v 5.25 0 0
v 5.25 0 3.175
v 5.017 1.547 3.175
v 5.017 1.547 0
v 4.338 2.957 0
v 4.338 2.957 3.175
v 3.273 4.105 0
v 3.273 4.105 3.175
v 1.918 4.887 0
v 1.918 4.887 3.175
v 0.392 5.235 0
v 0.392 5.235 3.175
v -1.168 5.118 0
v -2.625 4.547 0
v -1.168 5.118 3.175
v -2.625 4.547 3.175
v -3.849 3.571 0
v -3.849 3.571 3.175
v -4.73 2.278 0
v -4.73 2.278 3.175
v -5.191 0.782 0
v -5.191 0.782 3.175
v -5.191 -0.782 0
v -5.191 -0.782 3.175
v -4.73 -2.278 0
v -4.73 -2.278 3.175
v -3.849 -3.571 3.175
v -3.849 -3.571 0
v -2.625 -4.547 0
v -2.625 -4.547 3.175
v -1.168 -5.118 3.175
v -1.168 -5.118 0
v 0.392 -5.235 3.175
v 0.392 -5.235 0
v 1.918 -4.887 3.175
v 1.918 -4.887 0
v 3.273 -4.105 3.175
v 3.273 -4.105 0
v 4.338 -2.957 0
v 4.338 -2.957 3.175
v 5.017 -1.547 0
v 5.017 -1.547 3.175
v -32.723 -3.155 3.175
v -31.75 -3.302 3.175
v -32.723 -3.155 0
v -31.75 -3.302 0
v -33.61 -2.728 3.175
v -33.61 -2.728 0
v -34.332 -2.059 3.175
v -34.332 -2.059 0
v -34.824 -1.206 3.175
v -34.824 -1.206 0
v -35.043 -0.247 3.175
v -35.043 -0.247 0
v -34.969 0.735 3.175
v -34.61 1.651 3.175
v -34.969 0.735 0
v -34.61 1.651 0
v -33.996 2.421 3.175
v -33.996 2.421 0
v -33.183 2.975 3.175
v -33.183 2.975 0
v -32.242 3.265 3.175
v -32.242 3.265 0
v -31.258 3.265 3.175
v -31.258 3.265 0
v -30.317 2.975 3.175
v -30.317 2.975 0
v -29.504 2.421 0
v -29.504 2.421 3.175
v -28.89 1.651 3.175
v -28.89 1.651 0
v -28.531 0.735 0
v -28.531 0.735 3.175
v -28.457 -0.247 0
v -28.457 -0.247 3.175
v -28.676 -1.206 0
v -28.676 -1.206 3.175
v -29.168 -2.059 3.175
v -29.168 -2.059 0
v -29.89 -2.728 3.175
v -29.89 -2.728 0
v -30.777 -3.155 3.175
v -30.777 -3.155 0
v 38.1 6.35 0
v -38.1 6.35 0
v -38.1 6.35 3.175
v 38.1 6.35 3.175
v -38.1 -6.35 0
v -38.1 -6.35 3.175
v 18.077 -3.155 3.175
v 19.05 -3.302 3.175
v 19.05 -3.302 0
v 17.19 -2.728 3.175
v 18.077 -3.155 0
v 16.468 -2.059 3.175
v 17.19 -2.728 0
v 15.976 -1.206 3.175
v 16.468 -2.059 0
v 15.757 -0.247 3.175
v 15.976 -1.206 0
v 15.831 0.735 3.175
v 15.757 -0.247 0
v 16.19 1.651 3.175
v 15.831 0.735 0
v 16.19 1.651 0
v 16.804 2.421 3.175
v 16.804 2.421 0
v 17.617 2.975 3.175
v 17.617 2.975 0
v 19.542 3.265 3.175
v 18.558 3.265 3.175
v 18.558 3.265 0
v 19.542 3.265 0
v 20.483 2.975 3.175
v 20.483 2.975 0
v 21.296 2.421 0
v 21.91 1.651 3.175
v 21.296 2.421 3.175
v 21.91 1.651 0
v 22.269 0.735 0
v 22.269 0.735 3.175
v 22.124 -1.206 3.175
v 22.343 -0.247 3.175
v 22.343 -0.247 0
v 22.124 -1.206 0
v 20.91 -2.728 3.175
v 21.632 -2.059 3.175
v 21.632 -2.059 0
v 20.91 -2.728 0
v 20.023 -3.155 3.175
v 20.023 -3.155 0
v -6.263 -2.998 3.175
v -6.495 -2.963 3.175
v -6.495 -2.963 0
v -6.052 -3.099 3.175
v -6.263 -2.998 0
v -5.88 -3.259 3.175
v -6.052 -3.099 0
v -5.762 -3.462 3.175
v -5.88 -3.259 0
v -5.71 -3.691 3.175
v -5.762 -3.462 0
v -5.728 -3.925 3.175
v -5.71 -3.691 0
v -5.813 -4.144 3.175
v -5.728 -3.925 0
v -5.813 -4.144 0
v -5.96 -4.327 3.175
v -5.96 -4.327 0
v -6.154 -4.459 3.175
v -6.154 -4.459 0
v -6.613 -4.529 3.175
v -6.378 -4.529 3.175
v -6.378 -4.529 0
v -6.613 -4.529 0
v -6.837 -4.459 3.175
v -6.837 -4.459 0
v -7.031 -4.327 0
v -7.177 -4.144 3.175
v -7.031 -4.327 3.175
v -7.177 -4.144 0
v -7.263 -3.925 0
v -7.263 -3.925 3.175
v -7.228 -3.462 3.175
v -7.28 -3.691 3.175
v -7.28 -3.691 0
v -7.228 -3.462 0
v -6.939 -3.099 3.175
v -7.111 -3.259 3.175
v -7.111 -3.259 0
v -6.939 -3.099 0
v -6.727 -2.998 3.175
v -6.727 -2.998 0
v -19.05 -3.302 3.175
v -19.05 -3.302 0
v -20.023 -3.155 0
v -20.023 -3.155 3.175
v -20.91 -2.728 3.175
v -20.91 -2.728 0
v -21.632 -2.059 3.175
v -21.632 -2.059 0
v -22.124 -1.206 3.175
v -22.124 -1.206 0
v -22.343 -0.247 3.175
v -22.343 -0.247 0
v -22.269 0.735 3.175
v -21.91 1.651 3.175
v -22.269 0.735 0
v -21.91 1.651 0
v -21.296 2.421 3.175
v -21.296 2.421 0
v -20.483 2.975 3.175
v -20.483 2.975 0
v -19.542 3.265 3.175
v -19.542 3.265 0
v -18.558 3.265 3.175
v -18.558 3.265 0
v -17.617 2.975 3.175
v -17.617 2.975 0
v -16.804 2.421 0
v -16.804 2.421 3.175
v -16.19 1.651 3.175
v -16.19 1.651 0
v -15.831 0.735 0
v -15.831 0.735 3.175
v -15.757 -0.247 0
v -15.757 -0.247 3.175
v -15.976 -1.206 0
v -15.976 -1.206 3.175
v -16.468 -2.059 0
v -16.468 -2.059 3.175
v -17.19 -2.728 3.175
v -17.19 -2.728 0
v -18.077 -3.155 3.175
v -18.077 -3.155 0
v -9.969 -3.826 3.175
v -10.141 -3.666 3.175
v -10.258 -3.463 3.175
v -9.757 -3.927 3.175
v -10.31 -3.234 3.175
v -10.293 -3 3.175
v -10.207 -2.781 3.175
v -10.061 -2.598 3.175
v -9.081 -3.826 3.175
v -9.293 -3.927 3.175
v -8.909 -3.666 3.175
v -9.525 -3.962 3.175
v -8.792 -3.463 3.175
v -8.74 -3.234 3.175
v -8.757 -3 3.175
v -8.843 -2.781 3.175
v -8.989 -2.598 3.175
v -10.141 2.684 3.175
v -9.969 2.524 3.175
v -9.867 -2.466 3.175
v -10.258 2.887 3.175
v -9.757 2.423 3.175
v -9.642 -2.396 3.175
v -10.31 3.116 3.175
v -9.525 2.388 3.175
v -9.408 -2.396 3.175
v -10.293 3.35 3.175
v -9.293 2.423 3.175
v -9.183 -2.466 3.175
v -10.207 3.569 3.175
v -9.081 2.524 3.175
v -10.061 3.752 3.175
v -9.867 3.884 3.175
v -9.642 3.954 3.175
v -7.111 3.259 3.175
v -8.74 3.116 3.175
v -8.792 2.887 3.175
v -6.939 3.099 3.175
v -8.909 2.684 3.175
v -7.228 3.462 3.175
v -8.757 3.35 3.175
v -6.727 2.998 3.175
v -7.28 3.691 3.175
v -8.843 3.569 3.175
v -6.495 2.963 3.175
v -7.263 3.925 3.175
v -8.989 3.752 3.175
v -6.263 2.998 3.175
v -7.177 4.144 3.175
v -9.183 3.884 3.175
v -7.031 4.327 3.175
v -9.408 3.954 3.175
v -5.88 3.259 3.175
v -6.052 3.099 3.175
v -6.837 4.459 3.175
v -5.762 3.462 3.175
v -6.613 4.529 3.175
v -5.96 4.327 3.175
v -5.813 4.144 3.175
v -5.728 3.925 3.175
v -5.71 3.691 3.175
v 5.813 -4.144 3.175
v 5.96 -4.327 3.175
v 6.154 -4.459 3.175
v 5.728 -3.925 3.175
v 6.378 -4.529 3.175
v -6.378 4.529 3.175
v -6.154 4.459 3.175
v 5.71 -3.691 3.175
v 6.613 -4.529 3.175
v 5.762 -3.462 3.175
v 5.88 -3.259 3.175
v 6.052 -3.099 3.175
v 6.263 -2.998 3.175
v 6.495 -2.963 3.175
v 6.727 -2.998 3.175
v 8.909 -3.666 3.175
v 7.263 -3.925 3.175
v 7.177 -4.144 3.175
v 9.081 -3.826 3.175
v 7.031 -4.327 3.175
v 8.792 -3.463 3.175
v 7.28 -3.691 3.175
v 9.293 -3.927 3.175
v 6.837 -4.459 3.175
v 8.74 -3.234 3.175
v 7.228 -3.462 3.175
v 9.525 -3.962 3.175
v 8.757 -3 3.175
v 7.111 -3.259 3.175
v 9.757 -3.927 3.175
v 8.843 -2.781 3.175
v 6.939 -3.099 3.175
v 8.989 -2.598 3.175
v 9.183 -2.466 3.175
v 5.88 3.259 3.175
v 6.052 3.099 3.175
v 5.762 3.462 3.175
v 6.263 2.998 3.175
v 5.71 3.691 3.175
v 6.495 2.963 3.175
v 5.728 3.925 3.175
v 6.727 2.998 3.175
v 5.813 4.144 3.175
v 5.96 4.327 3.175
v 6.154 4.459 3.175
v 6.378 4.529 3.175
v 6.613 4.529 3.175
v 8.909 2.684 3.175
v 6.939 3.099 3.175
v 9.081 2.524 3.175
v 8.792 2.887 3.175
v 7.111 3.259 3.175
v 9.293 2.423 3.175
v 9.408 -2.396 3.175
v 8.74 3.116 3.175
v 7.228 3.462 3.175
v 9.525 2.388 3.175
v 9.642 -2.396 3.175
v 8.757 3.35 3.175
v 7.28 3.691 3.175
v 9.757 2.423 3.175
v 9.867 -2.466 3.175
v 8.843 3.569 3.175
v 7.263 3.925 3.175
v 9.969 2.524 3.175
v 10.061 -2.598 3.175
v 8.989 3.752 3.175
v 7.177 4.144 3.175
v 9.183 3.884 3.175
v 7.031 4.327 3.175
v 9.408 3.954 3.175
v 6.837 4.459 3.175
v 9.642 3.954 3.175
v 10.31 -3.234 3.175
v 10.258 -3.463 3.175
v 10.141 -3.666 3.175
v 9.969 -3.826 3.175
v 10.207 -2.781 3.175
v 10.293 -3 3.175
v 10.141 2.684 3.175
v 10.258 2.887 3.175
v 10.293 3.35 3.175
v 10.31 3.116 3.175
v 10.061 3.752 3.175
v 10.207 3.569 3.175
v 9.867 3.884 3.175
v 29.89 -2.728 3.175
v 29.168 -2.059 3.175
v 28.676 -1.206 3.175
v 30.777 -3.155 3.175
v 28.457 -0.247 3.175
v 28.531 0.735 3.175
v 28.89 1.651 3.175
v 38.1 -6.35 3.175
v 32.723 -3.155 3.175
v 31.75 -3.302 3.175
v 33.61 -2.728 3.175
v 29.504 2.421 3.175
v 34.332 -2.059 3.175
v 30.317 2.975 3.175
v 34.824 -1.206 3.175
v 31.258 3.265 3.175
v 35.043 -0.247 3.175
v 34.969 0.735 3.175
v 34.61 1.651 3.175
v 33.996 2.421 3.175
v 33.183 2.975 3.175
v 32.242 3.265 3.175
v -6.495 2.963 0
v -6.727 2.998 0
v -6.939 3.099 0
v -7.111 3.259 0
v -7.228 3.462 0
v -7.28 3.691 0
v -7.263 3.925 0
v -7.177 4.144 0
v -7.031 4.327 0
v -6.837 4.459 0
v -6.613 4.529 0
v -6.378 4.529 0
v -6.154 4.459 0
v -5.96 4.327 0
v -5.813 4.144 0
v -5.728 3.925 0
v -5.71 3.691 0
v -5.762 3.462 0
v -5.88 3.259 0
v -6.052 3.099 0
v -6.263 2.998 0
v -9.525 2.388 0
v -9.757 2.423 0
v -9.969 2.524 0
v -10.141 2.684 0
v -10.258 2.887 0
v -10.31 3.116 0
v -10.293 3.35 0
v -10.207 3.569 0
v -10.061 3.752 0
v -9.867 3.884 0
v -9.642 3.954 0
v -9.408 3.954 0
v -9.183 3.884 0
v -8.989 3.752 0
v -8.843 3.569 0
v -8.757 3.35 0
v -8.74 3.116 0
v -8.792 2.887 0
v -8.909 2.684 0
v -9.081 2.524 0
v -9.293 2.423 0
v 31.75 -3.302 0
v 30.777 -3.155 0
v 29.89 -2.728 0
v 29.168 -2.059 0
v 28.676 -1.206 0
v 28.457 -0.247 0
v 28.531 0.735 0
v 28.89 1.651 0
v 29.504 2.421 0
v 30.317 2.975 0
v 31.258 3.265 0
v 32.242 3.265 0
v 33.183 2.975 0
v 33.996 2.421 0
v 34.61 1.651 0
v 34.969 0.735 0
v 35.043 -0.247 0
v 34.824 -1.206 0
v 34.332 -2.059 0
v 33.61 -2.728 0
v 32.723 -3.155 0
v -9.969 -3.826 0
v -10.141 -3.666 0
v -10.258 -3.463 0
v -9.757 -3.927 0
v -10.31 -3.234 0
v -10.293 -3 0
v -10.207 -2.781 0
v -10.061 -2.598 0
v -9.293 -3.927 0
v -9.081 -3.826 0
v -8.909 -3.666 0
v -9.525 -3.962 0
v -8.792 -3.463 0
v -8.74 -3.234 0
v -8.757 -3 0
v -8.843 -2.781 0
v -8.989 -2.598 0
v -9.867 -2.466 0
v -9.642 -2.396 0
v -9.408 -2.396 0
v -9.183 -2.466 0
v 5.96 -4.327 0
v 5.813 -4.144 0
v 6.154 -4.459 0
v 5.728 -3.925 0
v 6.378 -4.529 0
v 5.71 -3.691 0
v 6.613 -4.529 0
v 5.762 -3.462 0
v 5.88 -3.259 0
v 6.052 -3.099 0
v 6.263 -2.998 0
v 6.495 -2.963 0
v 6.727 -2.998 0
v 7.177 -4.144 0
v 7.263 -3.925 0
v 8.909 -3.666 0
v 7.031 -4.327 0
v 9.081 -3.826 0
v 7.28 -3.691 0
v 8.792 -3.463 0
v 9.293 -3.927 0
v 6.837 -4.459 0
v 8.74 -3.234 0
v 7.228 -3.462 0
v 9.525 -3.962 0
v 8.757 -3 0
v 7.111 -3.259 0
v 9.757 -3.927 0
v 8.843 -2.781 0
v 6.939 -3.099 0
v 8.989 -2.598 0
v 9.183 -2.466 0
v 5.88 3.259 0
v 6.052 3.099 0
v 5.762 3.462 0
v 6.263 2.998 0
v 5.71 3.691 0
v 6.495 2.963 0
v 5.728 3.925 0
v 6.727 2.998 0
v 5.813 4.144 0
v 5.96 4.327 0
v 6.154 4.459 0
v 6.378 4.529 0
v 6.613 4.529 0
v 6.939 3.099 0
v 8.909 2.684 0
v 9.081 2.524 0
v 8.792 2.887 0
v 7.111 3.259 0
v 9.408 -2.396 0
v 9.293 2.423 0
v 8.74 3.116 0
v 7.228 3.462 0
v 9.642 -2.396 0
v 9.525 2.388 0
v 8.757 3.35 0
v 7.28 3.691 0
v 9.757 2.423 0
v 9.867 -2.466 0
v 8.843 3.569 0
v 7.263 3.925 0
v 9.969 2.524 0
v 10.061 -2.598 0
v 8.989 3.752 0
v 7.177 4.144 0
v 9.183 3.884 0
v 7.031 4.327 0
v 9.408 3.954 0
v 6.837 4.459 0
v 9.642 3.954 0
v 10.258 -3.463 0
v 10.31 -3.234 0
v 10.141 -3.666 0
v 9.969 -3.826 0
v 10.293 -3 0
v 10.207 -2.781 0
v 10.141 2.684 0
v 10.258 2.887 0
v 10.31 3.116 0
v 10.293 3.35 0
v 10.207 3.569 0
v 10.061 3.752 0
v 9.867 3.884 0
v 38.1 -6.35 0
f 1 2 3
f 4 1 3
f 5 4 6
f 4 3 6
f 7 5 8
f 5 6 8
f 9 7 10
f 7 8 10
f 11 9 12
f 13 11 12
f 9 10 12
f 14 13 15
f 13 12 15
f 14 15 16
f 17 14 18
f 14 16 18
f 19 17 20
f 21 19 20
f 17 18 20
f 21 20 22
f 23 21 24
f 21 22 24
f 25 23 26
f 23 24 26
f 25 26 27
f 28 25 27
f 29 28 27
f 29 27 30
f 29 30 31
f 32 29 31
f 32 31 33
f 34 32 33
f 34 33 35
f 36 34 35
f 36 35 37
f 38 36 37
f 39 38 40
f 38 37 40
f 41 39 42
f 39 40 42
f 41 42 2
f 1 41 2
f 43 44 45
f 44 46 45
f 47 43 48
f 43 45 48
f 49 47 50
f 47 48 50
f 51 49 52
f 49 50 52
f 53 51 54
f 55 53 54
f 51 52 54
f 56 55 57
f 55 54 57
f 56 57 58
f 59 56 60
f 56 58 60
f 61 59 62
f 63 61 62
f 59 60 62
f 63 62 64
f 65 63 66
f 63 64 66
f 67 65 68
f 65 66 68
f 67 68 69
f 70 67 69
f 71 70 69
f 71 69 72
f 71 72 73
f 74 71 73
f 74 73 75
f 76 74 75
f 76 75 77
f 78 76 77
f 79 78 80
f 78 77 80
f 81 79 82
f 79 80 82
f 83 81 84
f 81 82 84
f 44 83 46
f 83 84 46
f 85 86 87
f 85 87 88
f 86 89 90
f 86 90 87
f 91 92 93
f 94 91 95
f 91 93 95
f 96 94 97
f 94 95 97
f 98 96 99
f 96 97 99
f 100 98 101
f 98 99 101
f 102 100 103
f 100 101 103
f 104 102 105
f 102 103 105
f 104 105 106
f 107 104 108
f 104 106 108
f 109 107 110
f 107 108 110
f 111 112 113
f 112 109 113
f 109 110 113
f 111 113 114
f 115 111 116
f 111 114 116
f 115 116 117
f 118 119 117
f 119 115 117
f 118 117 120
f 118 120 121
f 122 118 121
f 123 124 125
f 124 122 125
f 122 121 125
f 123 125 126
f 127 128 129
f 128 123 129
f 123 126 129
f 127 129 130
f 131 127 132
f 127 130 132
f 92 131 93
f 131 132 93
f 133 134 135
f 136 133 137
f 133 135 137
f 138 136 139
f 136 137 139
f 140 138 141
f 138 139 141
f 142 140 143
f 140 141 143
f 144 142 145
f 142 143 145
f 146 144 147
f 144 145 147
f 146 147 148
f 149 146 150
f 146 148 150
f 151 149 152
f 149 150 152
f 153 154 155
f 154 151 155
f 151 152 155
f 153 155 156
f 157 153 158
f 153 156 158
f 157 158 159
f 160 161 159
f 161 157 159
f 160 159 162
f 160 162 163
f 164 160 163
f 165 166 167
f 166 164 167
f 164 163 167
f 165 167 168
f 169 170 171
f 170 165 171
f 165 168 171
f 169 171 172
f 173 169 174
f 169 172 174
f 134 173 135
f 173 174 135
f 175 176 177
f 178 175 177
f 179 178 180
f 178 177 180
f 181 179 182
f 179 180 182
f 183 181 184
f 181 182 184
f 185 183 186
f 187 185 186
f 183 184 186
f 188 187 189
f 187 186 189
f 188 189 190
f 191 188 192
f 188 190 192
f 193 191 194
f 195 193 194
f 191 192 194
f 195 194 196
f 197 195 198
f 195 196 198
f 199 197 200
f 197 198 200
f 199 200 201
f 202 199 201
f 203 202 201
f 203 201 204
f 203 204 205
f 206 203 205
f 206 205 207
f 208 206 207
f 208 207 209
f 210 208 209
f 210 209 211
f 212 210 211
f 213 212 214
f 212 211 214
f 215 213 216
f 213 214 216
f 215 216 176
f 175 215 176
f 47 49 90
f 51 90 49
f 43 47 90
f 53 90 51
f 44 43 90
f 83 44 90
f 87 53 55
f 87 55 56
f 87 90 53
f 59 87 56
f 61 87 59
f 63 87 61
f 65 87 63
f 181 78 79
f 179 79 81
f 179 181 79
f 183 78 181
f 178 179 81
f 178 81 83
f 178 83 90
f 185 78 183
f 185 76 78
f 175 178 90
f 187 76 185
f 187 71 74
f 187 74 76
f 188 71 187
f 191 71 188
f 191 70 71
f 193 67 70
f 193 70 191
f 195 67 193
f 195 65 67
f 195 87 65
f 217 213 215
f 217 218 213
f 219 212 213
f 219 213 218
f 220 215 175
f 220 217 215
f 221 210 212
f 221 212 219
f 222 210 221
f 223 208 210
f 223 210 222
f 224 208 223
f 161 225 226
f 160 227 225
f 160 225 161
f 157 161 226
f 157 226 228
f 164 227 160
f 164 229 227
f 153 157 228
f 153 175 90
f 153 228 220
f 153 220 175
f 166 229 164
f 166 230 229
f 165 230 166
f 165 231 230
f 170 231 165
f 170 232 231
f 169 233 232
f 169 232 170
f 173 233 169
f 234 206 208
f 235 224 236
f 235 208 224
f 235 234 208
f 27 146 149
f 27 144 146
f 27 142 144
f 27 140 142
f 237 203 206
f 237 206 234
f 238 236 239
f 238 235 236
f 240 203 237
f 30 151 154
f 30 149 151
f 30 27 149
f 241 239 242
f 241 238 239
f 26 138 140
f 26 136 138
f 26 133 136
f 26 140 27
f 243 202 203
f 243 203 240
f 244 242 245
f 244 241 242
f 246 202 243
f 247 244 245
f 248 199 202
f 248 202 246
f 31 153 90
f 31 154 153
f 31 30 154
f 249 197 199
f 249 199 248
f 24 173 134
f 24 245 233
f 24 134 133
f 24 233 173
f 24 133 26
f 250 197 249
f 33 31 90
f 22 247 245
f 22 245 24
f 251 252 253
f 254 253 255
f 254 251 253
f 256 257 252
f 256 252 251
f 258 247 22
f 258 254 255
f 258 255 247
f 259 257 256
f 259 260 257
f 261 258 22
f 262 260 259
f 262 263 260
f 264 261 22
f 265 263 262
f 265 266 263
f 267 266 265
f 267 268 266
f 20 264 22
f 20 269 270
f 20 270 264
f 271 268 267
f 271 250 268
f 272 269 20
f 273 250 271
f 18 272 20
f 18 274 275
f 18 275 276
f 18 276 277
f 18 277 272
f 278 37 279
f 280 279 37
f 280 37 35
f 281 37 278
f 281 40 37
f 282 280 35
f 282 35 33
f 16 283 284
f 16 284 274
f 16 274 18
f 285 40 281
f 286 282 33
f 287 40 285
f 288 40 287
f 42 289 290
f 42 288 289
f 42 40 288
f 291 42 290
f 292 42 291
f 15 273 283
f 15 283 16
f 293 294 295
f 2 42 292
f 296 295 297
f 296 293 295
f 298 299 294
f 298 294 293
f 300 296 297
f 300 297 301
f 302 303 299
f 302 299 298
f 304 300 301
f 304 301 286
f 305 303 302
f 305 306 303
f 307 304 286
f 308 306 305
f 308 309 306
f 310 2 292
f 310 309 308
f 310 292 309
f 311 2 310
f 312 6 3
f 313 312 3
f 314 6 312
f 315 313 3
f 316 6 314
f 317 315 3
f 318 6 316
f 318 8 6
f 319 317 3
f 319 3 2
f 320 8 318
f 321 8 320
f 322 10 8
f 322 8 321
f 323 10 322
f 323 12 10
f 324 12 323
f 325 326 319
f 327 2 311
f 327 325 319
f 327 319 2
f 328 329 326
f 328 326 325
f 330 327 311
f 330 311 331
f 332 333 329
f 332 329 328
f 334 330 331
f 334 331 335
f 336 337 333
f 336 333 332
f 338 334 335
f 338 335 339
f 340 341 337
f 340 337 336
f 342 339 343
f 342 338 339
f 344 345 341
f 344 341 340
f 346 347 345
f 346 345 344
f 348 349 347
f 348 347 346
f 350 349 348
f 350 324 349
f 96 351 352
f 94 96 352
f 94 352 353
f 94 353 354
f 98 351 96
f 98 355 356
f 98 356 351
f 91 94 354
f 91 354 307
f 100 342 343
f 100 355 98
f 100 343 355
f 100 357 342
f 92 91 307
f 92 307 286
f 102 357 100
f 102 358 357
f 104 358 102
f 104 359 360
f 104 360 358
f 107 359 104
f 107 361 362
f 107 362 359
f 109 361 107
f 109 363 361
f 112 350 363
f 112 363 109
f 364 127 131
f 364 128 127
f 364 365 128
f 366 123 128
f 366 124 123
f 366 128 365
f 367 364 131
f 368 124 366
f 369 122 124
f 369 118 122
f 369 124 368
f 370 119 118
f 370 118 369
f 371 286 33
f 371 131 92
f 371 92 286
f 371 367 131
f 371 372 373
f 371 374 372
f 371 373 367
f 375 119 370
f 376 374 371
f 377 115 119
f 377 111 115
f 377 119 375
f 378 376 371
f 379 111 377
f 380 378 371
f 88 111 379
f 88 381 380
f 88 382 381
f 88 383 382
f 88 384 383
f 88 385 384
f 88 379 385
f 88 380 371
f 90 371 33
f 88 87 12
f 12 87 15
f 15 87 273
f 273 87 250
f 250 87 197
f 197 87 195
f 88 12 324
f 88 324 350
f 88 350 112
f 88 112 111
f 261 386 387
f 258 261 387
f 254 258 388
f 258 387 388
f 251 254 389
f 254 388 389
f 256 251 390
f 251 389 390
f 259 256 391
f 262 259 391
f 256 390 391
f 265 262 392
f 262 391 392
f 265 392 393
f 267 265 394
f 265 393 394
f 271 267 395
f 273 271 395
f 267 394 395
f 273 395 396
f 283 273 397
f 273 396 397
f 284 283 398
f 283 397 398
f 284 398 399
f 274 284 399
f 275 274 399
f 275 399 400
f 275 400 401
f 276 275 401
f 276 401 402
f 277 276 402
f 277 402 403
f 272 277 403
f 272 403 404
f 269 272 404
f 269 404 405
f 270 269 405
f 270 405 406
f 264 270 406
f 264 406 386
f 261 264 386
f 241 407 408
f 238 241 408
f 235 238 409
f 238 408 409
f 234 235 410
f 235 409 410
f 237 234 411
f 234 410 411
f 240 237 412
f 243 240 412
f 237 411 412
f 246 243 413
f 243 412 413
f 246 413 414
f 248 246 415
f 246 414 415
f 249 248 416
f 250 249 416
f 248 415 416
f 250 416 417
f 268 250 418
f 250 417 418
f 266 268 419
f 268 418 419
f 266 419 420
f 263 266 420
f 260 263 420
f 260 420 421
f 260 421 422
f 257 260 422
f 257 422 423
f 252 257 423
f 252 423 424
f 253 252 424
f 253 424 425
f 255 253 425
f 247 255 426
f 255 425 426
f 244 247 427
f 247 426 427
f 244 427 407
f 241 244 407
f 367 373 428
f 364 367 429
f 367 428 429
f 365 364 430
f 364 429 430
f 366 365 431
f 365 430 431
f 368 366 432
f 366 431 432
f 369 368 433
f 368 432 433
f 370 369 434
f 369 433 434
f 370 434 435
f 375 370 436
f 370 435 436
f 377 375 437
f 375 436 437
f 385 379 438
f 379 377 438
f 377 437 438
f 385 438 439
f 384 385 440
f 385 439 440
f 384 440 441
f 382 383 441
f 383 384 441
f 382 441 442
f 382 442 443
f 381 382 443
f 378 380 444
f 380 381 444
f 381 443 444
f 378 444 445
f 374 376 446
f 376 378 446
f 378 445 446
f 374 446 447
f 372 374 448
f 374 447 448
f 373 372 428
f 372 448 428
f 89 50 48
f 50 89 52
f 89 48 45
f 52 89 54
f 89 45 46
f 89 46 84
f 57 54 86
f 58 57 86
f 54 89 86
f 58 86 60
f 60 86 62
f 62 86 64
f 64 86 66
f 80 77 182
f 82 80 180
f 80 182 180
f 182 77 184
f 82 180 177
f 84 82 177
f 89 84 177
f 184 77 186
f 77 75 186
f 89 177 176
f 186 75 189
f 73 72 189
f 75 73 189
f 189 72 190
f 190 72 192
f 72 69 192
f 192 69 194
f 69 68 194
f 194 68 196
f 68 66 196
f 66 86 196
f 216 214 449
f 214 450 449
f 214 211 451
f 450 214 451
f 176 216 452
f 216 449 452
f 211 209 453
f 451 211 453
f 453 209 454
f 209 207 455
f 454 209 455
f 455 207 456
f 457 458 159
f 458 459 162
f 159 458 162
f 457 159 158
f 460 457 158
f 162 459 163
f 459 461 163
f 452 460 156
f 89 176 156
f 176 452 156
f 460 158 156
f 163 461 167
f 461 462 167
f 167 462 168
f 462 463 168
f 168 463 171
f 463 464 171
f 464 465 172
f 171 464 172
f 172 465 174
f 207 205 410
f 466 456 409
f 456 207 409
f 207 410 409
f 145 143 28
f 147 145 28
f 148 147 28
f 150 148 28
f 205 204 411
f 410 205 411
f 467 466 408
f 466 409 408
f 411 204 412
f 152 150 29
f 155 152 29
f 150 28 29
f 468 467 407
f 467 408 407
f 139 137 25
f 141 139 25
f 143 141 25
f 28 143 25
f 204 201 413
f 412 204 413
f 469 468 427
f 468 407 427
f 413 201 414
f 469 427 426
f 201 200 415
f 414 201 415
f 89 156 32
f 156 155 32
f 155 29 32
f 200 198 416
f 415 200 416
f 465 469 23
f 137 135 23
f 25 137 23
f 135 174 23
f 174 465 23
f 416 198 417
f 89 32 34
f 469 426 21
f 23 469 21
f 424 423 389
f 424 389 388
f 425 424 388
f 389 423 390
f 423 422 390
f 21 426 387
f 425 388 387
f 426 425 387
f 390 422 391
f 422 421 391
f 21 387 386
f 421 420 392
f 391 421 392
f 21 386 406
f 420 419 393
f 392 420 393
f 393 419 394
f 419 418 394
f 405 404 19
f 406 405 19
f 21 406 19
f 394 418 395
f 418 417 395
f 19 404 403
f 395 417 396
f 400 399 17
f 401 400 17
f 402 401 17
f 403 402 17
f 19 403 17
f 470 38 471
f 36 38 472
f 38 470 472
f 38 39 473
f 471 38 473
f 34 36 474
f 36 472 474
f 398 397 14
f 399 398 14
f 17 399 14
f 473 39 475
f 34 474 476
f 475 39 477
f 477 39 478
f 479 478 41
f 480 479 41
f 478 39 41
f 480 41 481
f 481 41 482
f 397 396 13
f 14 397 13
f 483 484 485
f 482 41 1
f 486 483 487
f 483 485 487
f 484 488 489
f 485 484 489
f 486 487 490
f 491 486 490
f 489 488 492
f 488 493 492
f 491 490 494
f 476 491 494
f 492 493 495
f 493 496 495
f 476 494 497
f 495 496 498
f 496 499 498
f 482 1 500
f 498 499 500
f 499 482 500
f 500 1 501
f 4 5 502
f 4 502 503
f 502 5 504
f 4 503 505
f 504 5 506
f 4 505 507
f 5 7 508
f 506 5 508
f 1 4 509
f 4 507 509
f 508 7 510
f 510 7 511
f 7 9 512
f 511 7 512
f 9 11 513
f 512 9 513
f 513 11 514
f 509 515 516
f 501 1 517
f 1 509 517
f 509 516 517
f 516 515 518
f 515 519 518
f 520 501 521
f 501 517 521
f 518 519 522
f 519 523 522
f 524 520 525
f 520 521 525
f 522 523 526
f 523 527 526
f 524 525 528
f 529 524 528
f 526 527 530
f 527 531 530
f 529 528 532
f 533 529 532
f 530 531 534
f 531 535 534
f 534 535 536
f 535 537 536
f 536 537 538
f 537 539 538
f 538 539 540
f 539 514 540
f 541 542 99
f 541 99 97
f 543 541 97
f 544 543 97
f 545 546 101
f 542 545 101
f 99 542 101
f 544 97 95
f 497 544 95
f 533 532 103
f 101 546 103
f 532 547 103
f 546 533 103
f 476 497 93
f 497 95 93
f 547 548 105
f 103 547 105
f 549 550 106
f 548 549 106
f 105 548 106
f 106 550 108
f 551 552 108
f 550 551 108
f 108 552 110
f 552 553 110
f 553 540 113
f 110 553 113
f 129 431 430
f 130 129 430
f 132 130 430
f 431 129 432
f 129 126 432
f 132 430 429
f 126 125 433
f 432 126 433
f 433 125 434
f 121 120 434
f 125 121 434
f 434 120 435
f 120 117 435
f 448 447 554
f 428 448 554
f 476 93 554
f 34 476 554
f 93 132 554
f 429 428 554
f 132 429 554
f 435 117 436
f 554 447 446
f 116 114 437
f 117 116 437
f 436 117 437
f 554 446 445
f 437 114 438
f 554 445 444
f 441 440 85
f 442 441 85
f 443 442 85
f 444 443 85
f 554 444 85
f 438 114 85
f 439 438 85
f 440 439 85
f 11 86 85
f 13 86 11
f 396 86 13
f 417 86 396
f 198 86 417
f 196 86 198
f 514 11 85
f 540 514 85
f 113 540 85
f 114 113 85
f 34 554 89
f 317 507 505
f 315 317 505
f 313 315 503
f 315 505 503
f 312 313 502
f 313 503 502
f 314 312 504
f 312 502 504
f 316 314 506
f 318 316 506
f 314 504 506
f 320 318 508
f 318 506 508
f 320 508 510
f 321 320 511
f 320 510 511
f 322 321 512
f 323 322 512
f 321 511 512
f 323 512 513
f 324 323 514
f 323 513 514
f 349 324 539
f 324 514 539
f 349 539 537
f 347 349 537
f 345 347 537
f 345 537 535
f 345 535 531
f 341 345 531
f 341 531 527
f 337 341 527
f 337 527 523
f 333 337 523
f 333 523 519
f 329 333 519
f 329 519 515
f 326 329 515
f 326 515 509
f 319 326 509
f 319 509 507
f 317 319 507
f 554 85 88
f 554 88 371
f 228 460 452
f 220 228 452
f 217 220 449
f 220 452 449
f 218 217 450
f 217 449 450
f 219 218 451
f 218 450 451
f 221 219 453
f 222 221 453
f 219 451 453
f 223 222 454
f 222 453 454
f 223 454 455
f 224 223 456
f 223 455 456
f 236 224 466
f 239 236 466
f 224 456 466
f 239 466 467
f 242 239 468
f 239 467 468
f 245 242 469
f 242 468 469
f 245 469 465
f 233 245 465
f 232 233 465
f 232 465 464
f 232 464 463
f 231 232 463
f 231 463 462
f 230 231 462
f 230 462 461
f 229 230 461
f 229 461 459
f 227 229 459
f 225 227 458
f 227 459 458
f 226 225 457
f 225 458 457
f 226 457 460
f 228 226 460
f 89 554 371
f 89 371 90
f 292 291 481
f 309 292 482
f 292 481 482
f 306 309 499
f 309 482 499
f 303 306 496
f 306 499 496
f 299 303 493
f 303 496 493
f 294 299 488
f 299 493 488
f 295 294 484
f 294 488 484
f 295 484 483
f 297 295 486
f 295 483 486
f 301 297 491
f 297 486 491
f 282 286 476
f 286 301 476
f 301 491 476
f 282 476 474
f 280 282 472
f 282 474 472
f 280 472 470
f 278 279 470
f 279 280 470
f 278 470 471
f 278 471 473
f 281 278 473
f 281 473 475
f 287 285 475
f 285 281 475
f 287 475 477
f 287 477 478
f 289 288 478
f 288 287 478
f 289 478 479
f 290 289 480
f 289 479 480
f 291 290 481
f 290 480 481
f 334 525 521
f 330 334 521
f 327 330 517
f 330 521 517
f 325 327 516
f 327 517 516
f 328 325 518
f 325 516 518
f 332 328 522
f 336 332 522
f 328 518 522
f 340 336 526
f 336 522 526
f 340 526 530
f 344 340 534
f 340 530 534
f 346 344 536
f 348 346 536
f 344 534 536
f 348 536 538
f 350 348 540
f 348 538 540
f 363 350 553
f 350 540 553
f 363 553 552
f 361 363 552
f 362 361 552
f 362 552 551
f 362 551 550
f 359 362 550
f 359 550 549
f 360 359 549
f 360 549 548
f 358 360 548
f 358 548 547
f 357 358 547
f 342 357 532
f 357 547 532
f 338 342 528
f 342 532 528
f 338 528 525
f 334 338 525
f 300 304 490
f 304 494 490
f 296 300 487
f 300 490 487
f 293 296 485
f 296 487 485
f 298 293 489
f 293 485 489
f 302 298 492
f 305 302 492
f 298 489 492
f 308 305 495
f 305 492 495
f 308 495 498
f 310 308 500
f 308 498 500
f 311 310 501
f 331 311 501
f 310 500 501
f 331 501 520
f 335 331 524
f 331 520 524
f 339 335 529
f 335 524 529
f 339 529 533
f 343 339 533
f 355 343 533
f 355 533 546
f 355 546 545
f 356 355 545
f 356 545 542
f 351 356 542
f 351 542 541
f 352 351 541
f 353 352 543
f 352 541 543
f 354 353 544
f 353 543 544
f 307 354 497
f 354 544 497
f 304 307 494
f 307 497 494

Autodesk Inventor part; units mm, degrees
ref_plane "YZ Plane" through (0, 0, 0) normal (1, 0, 0) x (0, 1, 0)
sketch "Sketch1" plane through (0, 0, 0) normal (0, 0, 1) x (1, 0, 0)
  circle A0 centre (0, 0) radius 6.477 construction
  circle A1 centre (0, 0) radius 4.75 construction
  circle A2 centre (0, 0) radius 9.525 construction
  line L0 (-38.1, -6.35) -> (38.1, -6.35) construction
  line L1 (38.1, -6.35) -> (38.1, 6.35) construction
  line L2 (38.1, 6.35) -> (-38.1, 6.35) construction
  line L3 (-38.1, 6.35) -> (-38.1, -6.35) construction
  line L4 (-38.1, 6.35) -> (38.1, 6.35)
  line L5 (38.1, 6.35) -> (38.1, -6.35)
  line L6 (38.1, -6.35) -> (-38.1, -6.35)
  line L7 (-38.1, -6.35) -> (-38.1, 6.35)
  dimension "d0" = 12.954
  dimension "d1" = 9.5
  dimension "d2" = 19.05
  dimension "d3" = 76.2
  dimension "d4" = 12.7
extrude "Extrusion1" add sketch "Sketch1" along normal blind 3.175
sketch "Sketch2" plane through (0, 0, 3.175) normal (0, 0, 1) x (1, 0, 0)
  circle A0 centre (0, 0) radius 5.25
  dimension "d7" = 10.5
extrude "Extrusion2" cut sketch "Sketch2" against normal through all
sketch "Sketch4" plane through (0, 0, 3.175) normal (0, 0, 1) x (1, 0, 0)
  circle A0 centre (0, 0) radius 5.25 projected
  circle A1 centre (0, 0) radius 7.5 construction
  arc A2 (6.4952, 3.75) -> (-6.4952, 3.75) centre (0, 0) ccw construction
  line L0 (0, 0) -> (6.4952, 3.75) construction
  line L1 (0, 0) -> (7.5, 0) construction
  line L2 (0, 0) -> (-6.4952, 3.75) construction
  point P0 (6.4952, 3.75)
  dimension "d13" = 15
  dimension "d14" = 30
  dimension "d15" = 120
hole "Hole1" at (-6.4952, 3.75, 3.175) at (6.4952, 3.75, 3.175) direction (0, 0, -1) diameter 1.5748 end through all
sketch "Sketch5" plane through (0, 0, 3.175) normal (0, 0, 1) x (1, 0, 0)
  circle A0 centre (6.4952, 3.75) radius 0.7874 projected
  circle A1 centre (-6.4952, 3.75) radius 0.7874 projected
  circle A2 centre (0, 0) radius 5.25 projected
  line L0 (38.1, -6.35) -> (-38.1, -6.35) projected
  line L1 (38.1, 6.35) -> (38.1, -6.35) projected
  line L2 (-38.1, 6.35) -> (38.1, 6.35) projected
  line L3 (-38.1, -6.35) -> (-38.1, 6.35) projected
  line L4 (-30.9265, 0) -> (29.6642, 0) construction
ref_plane "Work Plane1" through (-30.9265, 0, 3.175) normal (0, -1, 0) x (1, 0, 0)
mirror "Mirror1" about plane through (-30.9265, 0, 3.175) normal (0, -1, 0) of "Hole1"
sketch "Sketch6" plane through (0, 0, 3.175) normal (0, 0, 1) x (1, 0, 0)
  point P0 (-31.75, 0)
  point P1 (-19.05, 0)
hole "Hole2" at (-31.75, 0, 3.175) at (-19.05, 0, 3.175) direction (0, 0, -1) diameter 6.604 end through all clearance for "Flat Head Machine Screw" size "M6" standard "Ansi Metric M Profile"
sketch "Sketch7" plane through (0, 0, 3.175) normal (0, 0, 1) x (1, 0, 0)
  circle A0 centre (-19.05, 0) radius 3.302 projected
  circle A1 centre (-31.75, 0) radius 3.302 projected
  circle A2 centre (6.4952, -3.75) radius 0.7874 projected
  circle A3 centre (-6.4952, -3.75) radius 0.7874 projected
  circle A4 centre (6.4952, 3.75) radius 0.7874 projected
  circle A5 centre (-6.4952, 3.75) radius 0.7874 projected
  circle A6 centre (0, 0) radius 5.25 projected
  line L0 (38.1, -6.35) -> (-38.1, -6.35) projected
  line L1 (38.1, 6.35) -> (38.1, -6.35) projected
  line L2 (-38.1, 6.35) -> (38.1, 6.35) projected
  line L3 (-38.1, -6.35) -> (-38.1, 6.35) projected
  line L4 (0, 12.6269) -> (0, -12.6269) construction
ref_plane "Work Plane2" through (0, 12.6269, 3.175) normal (-1, 0, 0) x (0, -1, 0)
mirror "Mirror2" about plane through (0, 12.6269, 3.175) normal (-1, 0, 0) of "Hole2"
sketch "Sketch8" plane through (0, 0, 3.175) normal (0, 0, 1) x (1, 0, 0)
  point P0 (-9.525, -3.175)
  point P1 (-9.525, 3.175)
  point P2 (9.525, 3.175)
  point P3 (9.525, -3.175)
hole "Hole3" at (-9.525, 3.175, 3.175) at (-9.525, -3.175, 3.175) at (9.525, -3.175, 3.175) at (9.525, 3.175, 3.175) direction (0, 0, -1) diameter 1.5748 end through all
properties part number "simple_chuck"
